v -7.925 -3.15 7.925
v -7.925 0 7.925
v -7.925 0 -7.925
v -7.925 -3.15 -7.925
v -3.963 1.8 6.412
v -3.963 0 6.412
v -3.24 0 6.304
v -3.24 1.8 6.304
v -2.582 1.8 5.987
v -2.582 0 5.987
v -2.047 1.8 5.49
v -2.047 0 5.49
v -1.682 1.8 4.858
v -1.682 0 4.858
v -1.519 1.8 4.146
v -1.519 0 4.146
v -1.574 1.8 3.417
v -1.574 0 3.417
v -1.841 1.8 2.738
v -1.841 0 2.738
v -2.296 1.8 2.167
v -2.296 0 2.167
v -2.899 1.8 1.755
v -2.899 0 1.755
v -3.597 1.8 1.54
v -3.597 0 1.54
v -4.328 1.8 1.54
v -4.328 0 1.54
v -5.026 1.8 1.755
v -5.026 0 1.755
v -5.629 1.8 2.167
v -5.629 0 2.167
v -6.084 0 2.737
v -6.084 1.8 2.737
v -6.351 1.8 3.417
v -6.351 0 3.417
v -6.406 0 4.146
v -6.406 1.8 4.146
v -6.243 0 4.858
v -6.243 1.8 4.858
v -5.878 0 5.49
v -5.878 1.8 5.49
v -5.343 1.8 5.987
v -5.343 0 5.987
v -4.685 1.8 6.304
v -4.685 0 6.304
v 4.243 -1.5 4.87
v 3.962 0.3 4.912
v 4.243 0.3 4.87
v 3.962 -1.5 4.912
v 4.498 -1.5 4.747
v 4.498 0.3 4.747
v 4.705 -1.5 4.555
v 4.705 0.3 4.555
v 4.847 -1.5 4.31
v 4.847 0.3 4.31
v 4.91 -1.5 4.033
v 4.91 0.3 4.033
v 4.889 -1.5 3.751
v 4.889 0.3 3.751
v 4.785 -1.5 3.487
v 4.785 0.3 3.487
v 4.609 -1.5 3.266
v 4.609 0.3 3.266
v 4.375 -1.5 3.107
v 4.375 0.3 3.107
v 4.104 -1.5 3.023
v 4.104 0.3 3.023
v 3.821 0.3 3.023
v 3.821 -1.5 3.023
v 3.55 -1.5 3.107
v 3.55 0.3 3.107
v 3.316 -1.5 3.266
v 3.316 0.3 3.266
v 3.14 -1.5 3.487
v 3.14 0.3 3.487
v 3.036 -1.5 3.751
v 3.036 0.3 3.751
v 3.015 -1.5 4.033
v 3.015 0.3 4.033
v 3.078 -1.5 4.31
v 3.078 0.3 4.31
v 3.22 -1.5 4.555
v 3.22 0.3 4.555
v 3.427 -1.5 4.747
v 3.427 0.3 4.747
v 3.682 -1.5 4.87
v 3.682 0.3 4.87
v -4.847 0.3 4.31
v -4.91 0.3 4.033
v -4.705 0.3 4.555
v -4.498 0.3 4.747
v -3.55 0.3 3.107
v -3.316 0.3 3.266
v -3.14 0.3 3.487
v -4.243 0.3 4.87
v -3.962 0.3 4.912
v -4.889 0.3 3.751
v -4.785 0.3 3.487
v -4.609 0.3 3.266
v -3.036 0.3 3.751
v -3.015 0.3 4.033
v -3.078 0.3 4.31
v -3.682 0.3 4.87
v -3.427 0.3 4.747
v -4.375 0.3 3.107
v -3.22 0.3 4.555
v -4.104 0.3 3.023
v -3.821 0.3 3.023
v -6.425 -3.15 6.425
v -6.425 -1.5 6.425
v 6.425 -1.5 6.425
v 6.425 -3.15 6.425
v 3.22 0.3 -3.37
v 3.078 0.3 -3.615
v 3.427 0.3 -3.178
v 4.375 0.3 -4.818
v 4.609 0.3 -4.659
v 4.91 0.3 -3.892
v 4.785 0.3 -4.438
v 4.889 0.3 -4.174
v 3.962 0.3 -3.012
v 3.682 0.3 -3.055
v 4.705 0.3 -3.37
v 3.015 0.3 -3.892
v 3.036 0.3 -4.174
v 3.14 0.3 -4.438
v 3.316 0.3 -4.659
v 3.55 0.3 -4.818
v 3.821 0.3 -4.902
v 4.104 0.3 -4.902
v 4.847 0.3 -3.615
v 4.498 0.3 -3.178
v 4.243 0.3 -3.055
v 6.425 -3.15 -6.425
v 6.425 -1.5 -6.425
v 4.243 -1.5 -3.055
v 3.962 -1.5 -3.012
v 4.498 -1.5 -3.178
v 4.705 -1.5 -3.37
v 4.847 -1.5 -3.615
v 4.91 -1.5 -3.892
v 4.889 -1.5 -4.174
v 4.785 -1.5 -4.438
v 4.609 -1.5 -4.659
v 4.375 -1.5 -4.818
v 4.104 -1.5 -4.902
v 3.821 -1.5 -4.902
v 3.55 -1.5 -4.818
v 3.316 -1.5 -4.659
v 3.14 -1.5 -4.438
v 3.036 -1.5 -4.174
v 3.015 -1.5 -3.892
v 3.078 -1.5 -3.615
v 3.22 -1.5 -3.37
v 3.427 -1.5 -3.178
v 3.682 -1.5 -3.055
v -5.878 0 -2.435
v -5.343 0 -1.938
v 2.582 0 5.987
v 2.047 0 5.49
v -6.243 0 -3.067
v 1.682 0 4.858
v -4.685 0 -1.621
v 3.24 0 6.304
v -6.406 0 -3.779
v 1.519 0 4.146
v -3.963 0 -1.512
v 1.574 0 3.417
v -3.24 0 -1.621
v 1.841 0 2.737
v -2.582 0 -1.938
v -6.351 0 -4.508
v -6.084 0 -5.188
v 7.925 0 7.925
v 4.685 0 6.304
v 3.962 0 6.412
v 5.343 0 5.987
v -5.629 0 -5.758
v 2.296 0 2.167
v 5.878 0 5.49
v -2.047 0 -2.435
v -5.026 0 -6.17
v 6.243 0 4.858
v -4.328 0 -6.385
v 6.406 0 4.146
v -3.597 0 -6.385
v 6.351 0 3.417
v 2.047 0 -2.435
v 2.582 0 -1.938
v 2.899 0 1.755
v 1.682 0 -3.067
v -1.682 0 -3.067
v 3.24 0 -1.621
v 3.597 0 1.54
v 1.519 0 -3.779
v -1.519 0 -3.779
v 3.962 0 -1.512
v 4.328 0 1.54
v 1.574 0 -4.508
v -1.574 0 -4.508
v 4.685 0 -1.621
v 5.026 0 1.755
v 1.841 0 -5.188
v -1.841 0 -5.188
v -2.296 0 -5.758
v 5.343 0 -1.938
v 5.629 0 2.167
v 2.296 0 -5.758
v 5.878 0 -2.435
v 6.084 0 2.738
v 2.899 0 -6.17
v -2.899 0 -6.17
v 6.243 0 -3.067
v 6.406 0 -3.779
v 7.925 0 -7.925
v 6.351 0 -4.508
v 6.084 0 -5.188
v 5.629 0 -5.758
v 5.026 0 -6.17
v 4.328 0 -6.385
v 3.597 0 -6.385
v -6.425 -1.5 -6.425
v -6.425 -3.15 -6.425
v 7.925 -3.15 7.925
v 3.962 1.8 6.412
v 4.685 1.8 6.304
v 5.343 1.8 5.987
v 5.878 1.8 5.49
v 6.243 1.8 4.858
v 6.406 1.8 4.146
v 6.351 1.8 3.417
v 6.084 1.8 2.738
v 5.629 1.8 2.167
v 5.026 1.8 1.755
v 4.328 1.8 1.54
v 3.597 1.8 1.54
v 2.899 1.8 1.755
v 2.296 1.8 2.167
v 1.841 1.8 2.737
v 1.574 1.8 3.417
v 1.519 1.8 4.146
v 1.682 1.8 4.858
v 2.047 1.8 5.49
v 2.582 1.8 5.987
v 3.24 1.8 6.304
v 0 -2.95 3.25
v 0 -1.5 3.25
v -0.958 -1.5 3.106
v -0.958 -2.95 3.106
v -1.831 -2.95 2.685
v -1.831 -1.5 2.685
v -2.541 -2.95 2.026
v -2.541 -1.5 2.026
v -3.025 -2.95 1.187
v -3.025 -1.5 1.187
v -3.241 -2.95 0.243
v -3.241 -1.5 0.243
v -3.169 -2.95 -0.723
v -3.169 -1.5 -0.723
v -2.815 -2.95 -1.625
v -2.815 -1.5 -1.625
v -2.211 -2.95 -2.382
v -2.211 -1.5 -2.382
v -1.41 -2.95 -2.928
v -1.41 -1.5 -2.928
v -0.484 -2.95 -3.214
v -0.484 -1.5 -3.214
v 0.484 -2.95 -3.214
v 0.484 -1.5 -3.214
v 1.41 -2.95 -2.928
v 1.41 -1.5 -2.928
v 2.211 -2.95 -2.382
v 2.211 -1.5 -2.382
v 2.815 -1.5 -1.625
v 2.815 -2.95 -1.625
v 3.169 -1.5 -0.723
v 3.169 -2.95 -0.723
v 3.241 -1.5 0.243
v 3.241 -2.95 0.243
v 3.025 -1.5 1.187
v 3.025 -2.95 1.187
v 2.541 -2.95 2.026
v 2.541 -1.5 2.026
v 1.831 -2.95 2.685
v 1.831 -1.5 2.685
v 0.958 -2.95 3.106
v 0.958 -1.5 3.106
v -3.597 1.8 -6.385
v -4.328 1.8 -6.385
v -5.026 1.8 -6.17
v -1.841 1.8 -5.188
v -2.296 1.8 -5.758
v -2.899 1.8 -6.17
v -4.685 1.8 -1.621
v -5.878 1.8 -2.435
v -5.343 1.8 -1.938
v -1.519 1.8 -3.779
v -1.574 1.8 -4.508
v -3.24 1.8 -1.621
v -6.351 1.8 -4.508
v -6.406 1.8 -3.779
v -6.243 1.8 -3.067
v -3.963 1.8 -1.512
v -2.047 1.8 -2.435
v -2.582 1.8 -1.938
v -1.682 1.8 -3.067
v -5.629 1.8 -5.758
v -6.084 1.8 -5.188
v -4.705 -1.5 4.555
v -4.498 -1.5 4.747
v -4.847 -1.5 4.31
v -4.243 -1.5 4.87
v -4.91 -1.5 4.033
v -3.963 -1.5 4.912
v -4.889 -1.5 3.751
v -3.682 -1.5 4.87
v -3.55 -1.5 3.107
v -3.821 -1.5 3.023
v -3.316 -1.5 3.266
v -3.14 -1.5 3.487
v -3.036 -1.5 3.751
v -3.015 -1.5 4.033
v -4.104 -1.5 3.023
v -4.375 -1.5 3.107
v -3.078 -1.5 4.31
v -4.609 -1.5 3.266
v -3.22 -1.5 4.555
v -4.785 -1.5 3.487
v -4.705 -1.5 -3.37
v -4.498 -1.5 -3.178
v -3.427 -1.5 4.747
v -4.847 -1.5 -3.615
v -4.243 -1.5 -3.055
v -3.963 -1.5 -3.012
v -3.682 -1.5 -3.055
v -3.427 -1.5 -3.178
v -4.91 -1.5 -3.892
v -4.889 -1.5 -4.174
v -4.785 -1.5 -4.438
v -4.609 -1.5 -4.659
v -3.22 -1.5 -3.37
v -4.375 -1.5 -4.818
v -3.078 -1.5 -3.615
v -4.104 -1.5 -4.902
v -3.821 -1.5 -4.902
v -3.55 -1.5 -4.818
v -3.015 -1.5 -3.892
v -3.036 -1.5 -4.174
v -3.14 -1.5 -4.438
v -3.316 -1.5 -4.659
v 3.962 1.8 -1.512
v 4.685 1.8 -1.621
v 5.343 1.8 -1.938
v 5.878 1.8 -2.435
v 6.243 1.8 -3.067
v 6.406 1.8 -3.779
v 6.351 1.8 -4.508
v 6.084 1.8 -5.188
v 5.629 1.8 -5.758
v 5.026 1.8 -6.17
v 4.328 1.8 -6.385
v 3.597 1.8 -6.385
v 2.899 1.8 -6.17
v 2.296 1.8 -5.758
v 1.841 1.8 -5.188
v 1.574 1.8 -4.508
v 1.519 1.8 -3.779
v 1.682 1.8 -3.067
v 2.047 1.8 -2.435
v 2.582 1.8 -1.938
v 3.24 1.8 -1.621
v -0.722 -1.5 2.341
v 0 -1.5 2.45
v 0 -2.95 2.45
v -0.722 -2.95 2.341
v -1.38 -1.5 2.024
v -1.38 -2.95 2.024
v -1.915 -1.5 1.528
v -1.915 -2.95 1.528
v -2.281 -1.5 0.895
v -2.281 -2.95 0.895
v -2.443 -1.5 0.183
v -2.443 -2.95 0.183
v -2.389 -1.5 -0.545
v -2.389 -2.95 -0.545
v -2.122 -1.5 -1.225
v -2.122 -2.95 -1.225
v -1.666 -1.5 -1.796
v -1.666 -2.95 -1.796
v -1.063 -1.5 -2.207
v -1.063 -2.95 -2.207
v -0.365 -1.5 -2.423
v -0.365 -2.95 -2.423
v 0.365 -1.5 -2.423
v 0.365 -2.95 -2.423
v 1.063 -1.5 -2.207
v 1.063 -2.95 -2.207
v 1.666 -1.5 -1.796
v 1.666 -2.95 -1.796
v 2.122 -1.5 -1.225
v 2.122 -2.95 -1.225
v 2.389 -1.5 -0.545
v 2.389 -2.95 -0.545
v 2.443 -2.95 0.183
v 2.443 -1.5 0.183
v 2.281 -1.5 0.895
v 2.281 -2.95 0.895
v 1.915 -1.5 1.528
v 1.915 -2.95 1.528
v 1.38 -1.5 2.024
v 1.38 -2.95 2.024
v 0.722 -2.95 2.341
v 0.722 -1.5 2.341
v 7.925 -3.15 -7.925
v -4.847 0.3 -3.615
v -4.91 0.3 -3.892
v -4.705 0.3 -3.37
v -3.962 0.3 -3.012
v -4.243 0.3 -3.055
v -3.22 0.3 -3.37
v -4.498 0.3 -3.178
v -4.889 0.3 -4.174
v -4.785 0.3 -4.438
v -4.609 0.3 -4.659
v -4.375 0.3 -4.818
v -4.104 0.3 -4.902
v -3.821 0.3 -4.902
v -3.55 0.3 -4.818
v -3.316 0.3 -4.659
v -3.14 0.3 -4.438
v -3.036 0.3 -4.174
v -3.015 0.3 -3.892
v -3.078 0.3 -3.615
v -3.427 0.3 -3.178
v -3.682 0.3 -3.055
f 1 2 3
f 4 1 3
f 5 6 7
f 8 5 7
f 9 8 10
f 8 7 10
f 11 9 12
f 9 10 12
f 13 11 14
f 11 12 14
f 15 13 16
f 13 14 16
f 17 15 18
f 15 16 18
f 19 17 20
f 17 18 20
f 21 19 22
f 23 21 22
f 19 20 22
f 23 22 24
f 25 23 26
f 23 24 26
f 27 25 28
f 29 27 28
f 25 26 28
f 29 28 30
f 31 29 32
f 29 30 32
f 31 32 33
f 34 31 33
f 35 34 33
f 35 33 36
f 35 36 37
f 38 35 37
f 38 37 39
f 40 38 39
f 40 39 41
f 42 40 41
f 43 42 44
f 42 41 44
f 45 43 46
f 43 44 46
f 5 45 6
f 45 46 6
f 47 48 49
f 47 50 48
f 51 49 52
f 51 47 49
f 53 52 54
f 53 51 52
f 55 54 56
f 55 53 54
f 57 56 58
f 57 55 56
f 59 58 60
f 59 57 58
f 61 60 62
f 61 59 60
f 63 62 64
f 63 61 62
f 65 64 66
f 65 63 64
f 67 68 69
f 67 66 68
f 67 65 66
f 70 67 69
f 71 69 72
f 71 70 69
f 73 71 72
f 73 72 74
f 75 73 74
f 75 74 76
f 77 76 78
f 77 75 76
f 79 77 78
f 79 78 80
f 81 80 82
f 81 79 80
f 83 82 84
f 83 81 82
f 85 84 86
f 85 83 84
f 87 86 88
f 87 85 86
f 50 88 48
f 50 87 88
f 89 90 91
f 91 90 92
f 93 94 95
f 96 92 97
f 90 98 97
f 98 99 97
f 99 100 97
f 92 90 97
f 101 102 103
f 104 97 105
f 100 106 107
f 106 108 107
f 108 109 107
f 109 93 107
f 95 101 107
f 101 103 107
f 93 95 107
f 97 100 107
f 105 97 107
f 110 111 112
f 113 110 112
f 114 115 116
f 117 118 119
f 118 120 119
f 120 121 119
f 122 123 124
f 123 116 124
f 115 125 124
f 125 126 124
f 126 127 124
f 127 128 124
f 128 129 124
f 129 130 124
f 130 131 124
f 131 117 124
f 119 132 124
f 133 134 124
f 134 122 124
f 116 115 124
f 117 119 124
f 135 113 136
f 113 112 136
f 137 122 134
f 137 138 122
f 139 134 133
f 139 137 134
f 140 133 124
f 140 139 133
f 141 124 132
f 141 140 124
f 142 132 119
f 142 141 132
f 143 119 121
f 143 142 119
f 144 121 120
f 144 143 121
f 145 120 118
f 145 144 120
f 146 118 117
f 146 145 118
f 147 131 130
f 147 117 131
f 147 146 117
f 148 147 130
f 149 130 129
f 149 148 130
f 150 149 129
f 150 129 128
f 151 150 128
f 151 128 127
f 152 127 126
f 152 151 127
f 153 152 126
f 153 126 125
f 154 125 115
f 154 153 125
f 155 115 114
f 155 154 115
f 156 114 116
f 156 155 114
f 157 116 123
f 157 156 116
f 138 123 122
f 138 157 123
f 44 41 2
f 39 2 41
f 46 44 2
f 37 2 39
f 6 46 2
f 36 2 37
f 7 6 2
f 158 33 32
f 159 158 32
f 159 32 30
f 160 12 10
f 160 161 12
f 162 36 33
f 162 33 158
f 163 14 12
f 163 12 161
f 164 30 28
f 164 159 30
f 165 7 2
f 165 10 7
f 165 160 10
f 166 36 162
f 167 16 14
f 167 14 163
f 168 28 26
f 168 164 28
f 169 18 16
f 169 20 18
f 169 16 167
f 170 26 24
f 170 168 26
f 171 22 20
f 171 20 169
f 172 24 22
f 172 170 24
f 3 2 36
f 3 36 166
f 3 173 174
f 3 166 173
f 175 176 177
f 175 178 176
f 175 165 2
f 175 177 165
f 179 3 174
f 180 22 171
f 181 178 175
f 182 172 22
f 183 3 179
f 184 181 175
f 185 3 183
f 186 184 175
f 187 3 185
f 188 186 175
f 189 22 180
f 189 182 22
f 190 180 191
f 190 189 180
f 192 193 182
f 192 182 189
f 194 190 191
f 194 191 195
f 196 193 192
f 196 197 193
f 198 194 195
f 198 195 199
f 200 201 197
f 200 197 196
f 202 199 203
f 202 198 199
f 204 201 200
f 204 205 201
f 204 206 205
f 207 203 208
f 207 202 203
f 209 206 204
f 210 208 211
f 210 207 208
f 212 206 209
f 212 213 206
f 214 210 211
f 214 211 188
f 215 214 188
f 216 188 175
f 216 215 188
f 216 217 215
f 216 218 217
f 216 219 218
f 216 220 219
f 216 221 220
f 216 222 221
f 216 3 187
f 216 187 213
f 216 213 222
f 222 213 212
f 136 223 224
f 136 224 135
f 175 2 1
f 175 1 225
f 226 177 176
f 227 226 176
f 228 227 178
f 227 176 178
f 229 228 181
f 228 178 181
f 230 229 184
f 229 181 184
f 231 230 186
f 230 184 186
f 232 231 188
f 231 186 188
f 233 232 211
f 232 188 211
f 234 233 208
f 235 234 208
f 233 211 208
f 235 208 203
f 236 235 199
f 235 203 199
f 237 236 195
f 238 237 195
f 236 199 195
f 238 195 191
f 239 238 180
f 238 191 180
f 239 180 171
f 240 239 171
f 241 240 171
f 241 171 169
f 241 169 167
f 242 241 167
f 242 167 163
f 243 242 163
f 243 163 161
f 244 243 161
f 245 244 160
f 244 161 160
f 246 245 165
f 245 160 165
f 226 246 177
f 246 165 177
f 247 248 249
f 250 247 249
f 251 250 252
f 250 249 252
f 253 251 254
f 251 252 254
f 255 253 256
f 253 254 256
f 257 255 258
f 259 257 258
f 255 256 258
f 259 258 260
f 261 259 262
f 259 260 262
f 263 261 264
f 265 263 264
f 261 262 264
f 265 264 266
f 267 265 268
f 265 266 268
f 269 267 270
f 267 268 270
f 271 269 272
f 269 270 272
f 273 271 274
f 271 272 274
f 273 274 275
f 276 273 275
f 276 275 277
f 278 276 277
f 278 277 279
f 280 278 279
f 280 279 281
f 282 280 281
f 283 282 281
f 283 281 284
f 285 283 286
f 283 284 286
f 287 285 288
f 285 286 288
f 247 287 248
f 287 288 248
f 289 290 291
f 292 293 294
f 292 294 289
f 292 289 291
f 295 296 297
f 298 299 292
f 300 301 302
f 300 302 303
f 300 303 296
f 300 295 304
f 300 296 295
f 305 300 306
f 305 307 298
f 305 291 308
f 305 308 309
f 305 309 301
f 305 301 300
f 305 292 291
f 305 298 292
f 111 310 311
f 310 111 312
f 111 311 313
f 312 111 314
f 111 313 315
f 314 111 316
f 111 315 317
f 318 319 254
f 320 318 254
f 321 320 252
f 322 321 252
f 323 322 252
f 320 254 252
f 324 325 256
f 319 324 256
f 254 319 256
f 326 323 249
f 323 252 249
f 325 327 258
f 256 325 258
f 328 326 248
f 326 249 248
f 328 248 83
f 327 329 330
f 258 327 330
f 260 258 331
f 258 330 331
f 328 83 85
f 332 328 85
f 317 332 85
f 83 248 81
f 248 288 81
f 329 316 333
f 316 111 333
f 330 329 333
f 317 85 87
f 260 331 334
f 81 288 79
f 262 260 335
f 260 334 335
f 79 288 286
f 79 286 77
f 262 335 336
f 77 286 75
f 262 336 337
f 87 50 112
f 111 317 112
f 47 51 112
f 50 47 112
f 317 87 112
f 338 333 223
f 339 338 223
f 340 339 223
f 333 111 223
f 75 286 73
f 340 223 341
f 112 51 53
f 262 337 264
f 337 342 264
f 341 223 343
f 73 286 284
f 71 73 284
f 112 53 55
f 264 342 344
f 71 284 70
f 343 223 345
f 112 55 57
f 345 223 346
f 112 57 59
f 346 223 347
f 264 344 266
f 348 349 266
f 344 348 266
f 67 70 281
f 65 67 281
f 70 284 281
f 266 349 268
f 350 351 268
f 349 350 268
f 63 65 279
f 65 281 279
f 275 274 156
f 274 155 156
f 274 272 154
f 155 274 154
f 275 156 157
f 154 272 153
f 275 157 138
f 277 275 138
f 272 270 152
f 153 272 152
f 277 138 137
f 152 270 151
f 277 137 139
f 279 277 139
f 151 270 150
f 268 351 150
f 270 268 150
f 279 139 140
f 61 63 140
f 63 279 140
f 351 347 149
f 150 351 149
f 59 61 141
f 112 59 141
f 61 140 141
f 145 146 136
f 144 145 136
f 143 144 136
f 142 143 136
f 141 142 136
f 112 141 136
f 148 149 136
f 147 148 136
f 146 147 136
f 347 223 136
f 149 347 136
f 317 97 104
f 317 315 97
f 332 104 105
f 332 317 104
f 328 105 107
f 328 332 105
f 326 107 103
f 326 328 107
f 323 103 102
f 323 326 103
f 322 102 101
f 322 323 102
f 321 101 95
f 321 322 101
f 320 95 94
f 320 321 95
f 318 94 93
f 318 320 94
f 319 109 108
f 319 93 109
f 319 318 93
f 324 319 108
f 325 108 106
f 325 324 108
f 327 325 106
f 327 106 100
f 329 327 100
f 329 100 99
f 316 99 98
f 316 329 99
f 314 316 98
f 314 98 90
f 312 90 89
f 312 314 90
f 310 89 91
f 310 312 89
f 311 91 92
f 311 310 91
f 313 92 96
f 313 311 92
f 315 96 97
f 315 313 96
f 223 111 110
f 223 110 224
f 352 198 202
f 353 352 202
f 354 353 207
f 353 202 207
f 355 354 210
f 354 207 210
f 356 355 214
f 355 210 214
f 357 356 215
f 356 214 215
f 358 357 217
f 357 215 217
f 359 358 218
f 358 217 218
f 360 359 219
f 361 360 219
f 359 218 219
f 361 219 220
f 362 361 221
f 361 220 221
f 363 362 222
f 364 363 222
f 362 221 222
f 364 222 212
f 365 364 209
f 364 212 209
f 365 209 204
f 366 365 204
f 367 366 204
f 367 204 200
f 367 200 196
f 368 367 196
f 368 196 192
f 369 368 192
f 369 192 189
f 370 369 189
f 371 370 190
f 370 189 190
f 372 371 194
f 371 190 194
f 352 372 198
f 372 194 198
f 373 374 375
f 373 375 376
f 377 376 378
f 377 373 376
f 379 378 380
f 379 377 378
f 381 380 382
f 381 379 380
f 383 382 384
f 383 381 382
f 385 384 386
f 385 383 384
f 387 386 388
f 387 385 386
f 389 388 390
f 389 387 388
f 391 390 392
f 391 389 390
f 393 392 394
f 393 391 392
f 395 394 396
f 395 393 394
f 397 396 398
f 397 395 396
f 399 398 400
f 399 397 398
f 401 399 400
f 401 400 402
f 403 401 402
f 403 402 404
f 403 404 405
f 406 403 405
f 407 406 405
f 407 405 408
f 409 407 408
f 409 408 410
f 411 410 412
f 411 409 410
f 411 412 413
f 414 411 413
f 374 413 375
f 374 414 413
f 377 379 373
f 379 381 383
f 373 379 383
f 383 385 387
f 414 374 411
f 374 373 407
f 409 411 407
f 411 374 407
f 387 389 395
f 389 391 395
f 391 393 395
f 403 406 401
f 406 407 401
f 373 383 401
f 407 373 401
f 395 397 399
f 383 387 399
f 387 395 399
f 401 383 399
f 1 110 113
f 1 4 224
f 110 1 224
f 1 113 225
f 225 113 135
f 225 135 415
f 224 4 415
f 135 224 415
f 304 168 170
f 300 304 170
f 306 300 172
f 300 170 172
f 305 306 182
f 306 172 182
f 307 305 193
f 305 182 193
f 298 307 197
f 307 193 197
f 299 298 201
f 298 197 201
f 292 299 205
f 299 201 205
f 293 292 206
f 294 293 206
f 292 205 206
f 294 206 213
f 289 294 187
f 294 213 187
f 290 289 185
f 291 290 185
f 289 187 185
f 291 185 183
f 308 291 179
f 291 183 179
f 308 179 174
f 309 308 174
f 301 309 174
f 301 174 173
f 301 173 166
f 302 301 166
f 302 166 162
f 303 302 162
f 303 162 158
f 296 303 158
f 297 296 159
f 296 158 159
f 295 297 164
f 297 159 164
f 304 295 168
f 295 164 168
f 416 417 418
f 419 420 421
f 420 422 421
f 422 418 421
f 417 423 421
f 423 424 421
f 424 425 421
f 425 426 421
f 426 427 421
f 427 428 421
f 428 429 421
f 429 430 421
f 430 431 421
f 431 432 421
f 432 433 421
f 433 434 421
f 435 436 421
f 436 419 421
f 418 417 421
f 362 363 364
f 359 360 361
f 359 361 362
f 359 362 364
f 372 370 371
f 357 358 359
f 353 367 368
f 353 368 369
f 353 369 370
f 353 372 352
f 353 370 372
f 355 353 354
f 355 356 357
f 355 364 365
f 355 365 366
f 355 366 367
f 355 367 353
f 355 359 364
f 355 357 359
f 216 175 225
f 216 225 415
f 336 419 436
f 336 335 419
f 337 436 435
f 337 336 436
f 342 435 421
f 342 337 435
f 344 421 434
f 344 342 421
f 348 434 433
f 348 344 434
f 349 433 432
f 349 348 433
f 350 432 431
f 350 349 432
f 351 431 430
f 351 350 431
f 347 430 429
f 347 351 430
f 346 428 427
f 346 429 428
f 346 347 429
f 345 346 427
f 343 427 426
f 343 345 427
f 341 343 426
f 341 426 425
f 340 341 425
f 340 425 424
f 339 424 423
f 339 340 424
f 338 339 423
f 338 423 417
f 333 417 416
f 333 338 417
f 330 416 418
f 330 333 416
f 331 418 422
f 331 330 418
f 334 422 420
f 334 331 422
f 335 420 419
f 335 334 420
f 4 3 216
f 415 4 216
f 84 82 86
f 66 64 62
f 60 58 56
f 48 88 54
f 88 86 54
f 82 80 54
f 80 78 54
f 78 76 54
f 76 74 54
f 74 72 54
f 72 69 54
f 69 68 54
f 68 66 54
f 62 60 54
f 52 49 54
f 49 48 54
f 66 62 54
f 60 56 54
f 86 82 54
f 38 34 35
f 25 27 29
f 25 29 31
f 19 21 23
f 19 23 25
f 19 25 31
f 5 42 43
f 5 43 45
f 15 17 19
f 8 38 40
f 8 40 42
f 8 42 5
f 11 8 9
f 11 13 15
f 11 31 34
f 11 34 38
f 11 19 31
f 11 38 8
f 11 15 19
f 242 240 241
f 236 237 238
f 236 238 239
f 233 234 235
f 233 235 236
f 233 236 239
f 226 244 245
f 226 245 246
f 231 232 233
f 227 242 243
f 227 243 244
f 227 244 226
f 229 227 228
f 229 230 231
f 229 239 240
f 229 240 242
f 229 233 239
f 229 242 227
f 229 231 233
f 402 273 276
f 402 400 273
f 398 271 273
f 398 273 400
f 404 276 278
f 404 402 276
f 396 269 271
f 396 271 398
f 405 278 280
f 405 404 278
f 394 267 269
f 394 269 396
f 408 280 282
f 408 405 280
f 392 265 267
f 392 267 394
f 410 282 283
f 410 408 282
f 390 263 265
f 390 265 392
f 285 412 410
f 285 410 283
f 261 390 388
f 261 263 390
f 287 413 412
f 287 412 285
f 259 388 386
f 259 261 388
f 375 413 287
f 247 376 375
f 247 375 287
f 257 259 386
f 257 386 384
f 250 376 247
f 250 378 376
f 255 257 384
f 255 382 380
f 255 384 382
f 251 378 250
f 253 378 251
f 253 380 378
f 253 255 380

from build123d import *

# Parameters (mm, degrees)
SKETCH1_W           = 15.85
SKETCH1_H           = 15.85
BOSS_EXTRUDE1_DEPTH = 3.15
SKETCH2_R           = 2.45
BOSS_EXTRUDE2_DEPTH = 1.8
SHELL1_T            = -1.5
SKETCH3_R           = 3.25
SKETCH3_R_2         = 2.45
BOSS_EXTRUDE3_DEPTH = 1.45


with BuildPart() as part:
    # Sketch1 → Boss-Extrude1 (new body)
    with BuildSketch(Plane(origin=(0, 0, 0), x_dir=(1, 0, 0), z_dir=(0, 1, 0))):
        Rectangle(SKETCH1_W, SKETCH1_H)
    extrude(amount=-BOSS_EXTRUDE1_DEPTH)

    # Sketch2 → Boss-Extrude2 (add)
    with BuildSketch(Plane(origin=(0, 0, 0), x_dir=(1, 0, 0), z_dir=(0, 1, 0))):
        with Locations(Location((-3.9625, 3.9625, 0), (0, 0, 270))):
            Circle(SKETCH2_R)
        with Locations(Location((-3.9625, -3.9625, 0), (0, 0, 270))):
            Circle(SKETCH2_R)
        with Locations(Location((3.9625, 3.9625, 0), (0, 0, 270))):
            Circle(SKETCH2_R)
        with Locations(Location((3.9625, -3.9625, 0), (0, 0, 270))):
            Circle(SKETCH2_R)
    extrude(amount=BOSS_EXTRUDE2_DEPTH)

    # Shell1
    shell1_openings = [part.faces().sort_by_distance(p)[0] for p in [
        (0, -3.15, 0),
    ]]
    offset(amount=SHELL1_T, openings=shell1_openings, kind=Kind.INTERSECTION)

    # Sketch3 → Boss-Extrude3 (add)
    with BuildSketch(Plane.XZ.offset(1.5)):
        with Locations(Location((0, 0, 0), (0, 0, 90))):
            Circle(SKETCH3_R)
        with Locations(Location((0, 0, 0), (0, 0, 90))):
            Circle(SKETCH3_R_2, mode=Mode.SUBTRACT)
    extrude(amount=BOSS_EXTRUDE3_DEPTH)


solid = part.part
